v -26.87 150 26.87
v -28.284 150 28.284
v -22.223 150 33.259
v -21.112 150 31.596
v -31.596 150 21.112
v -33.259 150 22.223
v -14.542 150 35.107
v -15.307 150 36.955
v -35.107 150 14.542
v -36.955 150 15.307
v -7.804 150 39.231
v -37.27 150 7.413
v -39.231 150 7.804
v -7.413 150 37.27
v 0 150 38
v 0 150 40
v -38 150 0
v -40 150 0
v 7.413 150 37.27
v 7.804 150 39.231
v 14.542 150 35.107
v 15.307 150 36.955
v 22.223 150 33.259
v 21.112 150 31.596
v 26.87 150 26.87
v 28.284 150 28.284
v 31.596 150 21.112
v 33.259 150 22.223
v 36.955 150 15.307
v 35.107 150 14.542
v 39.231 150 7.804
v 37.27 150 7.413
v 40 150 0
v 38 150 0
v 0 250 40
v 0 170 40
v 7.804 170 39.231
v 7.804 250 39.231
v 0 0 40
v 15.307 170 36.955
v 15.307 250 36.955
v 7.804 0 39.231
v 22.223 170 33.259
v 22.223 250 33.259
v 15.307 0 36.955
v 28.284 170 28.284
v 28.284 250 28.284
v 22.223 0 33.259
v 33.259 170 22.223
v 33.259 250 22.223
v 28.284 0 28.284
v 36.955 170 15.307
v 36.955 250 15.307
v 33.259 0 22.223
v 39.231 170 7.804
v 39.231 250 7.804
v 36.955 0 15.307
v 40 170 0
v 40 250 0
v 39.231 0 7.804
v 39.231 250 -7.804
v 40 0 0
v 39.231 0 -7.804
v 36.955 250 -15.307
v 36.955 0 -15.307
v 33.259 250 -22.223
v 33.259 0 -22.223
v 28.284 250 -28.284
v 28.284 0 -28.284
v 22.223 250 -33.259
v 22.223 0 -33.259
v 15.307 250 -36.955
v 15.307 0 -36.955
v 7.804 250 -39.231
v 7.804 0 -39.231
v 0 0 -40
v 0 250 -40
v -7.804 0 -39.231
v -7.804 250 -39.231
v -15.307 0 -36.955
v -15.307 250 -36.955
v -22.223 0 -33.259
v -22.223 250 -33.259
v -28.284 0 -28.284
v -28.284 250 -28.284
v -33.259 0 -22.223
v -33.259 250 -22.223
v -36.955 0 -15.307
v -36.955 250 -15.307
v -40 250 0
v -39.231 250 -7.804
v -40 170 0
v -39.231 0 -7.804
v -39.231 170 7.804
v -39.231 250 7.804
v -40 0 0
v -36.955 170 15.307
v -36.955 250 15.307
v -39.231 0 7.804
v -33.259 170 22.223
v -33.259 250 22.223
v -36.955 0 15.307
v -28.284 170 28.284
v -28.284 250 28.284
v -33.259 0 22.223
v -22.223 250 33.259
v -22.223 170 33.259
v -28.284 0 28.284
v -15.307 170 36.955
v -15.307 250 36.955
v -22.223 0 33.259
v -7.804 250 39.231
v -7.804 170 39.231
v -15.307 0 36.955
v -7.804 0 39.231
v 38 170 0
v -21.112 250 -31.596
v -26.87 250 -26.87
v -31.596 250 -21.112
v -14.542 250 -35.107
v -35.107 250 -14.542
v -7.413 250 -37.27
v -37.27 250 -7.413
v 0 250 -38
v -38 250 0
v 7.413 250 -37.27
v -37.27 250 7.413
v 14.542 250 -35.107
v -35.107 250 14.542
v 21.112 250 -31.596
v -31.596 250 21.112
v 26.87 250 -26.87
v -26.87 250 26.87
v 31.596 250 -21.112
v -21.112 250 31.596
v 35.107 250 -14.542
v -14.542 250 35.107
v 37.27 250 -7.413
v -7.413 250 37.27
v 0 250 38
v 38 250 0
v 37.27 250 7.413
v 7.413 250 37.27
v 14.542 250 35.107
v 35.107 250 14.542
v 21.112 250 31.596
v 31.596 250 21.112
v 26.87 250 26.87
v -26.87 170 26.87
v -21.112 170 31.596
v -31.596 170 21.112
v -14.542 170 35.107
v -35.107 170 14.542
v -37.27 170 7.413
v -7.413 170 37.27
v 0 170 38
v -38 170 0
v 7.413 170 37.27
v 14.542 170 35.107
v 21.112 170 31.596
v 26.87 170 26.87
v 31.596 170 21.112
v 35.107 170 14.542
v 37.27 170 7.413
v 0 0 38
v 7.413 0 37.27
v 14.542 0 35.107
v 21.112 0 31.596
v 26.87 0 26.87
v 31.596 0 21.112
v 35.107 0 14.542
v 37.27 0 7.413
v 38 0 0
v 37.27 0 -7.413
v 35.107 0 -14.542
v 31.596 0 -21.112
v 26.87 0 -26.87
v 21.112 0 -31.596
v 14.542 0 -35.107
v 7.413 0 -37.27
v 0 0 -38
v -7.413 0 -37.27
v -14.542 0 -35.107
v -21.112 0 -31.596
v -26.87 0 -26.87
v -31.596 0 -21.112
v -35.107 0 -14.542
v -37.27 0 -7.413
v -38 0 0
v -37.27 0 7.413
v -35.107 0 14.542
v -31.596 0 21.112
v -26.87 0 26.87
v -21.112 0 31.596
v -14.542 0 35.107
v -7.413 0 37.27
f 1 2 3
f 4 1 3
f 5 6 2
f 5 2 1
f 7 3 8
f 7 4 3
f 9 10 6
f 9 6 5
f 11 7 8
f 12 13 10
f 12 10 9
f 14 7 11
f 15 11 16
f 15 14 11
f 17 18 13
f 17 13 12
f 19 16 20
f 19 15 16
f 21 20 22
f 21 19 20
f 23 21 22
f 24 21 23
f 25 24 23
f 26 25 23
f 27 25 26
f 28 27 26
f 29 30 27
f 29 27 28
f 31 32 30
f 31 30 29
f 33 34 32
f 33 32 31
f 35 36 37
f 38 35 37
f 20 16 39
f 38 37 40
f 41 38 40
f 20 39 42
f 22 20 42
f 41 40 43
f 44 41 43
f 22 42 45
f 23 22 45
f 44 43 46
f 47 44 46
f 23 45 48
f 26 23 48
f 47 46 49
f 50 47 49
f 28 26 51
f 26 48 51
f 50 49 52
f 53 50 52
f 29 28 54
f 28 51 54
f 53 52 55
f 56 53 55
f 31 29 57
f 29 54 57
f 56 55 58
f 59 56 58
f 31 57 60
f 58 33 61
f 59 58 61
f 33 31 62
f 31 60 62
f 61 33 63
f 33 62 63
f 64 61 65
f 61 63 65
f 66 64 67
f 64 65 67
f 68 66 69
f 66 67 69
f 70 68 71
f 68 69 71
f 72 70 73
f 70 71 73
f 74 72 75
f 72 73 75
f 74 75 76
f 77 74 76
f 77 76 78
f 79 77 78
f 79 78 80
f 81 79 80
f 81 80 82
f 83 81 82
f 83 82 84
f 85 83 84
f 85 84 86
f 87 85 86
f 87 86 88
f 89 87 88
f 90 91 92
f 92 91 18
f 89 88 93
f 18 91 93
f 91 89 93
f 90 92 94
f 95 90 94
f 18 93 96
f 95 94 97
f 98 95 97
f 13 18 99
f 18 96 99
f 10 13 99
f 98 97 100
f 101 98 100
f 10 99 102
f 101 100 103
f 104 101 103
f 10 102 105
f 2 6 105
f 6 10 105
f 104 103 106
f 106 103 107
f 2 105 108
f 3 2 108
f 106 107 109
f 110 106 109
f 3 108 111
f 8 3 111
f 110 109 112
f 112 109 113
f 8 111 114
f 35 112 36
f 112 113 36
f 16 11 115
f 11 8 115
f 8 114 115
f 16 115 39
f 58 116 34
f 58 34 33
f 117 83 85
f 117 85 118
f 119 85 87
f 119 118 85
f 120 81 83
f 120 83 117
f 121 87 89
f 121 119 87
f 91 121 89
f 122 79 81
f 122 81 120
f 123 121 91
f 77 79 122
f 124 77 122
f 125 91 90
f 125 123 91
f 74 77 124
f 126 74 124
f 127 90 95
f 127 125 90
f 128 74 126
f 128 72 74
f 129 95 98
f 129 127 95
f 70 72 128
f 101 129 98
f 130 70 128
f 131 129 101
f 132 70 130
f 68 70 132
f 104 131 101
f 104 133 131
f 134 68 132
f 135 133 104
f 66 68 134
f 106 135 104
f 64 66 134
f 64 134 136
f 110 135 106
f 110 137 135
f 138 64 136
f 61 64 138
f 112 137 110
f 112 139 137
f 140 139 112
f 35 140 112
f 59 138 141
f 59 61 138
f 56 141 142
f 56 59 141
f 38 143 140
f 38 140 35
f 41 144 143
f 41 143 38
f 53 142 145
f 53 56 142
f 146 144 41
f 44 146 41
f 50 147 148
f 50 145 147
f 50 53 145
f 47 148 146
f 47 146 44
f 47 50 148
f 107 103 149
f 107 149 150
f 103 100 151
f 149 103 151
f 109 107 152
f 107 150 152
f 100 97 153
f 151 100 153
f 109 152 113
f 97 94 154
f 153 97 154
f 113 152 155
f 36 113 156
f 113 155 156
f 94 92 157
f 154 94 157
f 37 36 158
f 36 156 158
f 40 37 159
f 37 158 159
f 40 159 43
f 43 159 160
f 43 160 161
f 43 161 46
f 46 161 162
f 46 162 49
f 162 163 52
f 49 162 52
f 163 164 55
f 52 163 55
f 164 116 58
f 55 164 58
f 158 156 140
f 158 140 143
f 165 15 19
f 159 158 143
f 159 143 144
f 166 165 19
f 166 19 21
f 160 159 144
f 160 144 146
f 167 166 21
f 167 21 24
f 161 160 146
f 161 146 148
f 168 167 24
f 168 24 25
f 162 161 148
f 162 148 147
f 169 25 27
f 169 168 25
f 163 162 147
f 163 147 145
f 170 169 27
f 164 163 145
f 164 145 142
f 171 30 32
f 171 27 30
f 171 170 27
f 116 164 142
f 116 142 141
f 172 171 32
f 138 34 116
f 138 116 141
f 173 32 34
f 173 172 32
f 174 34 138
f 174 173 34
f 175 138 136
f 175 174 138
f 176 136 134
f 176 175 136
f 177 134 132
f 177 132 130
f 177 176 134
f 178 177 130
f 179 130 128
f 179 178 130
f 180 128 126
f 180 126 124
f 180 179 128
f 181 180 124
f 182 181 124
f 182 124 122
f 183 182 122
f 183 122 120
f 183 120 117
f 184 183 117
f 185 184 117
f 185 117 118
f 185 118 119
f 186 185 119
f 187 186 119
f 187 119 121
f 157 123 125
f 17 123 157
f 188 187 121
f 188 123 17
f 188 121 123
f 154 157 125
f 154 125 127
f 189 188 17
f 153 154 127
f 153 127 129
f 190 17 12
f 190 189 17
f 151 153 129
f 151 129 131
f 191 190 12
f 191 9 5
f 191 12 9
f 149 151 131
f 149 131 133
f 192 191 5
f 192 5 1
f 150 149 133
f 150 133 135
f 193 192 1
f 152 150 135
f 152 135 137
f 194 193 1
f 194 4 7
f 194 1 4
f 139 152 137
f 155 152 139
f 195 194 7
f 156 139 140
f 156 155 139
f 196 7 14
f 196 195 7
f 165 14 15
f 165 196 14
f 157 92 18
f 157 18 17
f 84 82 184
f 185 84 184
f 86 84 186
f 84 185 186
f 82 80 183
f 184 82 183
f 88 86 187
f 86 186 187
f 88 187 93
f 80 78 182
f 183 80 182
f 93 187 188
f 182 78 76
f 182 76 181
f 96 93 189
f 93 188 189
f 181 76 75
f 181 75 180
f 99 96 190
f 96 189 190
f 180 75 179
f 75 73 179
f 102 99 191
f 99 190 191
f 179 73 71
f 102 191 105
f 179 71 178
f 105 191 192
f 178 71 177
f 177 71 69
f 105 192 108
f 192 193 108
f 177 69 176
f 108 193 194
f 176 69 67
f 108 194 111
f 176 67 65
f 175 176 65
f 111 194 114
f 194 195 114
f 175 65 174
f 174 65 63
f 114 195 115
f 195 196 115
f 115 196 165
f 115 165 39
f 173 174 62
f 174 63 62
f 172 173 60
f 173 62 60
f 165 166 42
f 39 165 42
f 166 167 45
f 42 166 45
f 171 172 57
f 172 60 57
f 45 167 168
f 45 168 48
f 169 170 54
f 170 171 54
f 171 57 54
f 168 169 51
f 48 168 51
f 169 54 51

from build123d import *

# Parameters (mm, degrees)
SKETCH1_R           = 40
SKETCH1_R_2         = 38
BOSS_EXTRUDE1_DEPTH = 250
SKETCH2_W           = 80
SKETCH2_H           = 20
CUT_EXTRUDE2_DEPTH  = 257.32011236


with BuildPart() as part:
    # Sketch1 → Boss-Extrude1 (new body)
    with BuildSketch(Plane(origin=(0, 0, 0), x_dir=(1, 0, 0), z_dir=(0, 1, 0))):
        with Locations(Location((0, 0, 0), (0, 0, 270))):
            Circle(SKETCH1_R)
        with Locations(Location((0, 0, 0), (0, 0, 270))):
            Circle(SKETCH1_R_2, mode=Mode.SUBTRACT)
    extrude(amount=BOSS_EXTRUDE1_DEPTH)

    # Sketch2 → Cut-Extrude2 (cut, through all)
    with BuildSketch(Plane.XY):
        with Locations((0, 160)):
            Rectangle(SKETCH2_W, SKETCH2_H)
    extrude(amount=CUT_EXTRUDE2_DEPTH, mode=Mode.SUBTRACT)


solid = part.part
